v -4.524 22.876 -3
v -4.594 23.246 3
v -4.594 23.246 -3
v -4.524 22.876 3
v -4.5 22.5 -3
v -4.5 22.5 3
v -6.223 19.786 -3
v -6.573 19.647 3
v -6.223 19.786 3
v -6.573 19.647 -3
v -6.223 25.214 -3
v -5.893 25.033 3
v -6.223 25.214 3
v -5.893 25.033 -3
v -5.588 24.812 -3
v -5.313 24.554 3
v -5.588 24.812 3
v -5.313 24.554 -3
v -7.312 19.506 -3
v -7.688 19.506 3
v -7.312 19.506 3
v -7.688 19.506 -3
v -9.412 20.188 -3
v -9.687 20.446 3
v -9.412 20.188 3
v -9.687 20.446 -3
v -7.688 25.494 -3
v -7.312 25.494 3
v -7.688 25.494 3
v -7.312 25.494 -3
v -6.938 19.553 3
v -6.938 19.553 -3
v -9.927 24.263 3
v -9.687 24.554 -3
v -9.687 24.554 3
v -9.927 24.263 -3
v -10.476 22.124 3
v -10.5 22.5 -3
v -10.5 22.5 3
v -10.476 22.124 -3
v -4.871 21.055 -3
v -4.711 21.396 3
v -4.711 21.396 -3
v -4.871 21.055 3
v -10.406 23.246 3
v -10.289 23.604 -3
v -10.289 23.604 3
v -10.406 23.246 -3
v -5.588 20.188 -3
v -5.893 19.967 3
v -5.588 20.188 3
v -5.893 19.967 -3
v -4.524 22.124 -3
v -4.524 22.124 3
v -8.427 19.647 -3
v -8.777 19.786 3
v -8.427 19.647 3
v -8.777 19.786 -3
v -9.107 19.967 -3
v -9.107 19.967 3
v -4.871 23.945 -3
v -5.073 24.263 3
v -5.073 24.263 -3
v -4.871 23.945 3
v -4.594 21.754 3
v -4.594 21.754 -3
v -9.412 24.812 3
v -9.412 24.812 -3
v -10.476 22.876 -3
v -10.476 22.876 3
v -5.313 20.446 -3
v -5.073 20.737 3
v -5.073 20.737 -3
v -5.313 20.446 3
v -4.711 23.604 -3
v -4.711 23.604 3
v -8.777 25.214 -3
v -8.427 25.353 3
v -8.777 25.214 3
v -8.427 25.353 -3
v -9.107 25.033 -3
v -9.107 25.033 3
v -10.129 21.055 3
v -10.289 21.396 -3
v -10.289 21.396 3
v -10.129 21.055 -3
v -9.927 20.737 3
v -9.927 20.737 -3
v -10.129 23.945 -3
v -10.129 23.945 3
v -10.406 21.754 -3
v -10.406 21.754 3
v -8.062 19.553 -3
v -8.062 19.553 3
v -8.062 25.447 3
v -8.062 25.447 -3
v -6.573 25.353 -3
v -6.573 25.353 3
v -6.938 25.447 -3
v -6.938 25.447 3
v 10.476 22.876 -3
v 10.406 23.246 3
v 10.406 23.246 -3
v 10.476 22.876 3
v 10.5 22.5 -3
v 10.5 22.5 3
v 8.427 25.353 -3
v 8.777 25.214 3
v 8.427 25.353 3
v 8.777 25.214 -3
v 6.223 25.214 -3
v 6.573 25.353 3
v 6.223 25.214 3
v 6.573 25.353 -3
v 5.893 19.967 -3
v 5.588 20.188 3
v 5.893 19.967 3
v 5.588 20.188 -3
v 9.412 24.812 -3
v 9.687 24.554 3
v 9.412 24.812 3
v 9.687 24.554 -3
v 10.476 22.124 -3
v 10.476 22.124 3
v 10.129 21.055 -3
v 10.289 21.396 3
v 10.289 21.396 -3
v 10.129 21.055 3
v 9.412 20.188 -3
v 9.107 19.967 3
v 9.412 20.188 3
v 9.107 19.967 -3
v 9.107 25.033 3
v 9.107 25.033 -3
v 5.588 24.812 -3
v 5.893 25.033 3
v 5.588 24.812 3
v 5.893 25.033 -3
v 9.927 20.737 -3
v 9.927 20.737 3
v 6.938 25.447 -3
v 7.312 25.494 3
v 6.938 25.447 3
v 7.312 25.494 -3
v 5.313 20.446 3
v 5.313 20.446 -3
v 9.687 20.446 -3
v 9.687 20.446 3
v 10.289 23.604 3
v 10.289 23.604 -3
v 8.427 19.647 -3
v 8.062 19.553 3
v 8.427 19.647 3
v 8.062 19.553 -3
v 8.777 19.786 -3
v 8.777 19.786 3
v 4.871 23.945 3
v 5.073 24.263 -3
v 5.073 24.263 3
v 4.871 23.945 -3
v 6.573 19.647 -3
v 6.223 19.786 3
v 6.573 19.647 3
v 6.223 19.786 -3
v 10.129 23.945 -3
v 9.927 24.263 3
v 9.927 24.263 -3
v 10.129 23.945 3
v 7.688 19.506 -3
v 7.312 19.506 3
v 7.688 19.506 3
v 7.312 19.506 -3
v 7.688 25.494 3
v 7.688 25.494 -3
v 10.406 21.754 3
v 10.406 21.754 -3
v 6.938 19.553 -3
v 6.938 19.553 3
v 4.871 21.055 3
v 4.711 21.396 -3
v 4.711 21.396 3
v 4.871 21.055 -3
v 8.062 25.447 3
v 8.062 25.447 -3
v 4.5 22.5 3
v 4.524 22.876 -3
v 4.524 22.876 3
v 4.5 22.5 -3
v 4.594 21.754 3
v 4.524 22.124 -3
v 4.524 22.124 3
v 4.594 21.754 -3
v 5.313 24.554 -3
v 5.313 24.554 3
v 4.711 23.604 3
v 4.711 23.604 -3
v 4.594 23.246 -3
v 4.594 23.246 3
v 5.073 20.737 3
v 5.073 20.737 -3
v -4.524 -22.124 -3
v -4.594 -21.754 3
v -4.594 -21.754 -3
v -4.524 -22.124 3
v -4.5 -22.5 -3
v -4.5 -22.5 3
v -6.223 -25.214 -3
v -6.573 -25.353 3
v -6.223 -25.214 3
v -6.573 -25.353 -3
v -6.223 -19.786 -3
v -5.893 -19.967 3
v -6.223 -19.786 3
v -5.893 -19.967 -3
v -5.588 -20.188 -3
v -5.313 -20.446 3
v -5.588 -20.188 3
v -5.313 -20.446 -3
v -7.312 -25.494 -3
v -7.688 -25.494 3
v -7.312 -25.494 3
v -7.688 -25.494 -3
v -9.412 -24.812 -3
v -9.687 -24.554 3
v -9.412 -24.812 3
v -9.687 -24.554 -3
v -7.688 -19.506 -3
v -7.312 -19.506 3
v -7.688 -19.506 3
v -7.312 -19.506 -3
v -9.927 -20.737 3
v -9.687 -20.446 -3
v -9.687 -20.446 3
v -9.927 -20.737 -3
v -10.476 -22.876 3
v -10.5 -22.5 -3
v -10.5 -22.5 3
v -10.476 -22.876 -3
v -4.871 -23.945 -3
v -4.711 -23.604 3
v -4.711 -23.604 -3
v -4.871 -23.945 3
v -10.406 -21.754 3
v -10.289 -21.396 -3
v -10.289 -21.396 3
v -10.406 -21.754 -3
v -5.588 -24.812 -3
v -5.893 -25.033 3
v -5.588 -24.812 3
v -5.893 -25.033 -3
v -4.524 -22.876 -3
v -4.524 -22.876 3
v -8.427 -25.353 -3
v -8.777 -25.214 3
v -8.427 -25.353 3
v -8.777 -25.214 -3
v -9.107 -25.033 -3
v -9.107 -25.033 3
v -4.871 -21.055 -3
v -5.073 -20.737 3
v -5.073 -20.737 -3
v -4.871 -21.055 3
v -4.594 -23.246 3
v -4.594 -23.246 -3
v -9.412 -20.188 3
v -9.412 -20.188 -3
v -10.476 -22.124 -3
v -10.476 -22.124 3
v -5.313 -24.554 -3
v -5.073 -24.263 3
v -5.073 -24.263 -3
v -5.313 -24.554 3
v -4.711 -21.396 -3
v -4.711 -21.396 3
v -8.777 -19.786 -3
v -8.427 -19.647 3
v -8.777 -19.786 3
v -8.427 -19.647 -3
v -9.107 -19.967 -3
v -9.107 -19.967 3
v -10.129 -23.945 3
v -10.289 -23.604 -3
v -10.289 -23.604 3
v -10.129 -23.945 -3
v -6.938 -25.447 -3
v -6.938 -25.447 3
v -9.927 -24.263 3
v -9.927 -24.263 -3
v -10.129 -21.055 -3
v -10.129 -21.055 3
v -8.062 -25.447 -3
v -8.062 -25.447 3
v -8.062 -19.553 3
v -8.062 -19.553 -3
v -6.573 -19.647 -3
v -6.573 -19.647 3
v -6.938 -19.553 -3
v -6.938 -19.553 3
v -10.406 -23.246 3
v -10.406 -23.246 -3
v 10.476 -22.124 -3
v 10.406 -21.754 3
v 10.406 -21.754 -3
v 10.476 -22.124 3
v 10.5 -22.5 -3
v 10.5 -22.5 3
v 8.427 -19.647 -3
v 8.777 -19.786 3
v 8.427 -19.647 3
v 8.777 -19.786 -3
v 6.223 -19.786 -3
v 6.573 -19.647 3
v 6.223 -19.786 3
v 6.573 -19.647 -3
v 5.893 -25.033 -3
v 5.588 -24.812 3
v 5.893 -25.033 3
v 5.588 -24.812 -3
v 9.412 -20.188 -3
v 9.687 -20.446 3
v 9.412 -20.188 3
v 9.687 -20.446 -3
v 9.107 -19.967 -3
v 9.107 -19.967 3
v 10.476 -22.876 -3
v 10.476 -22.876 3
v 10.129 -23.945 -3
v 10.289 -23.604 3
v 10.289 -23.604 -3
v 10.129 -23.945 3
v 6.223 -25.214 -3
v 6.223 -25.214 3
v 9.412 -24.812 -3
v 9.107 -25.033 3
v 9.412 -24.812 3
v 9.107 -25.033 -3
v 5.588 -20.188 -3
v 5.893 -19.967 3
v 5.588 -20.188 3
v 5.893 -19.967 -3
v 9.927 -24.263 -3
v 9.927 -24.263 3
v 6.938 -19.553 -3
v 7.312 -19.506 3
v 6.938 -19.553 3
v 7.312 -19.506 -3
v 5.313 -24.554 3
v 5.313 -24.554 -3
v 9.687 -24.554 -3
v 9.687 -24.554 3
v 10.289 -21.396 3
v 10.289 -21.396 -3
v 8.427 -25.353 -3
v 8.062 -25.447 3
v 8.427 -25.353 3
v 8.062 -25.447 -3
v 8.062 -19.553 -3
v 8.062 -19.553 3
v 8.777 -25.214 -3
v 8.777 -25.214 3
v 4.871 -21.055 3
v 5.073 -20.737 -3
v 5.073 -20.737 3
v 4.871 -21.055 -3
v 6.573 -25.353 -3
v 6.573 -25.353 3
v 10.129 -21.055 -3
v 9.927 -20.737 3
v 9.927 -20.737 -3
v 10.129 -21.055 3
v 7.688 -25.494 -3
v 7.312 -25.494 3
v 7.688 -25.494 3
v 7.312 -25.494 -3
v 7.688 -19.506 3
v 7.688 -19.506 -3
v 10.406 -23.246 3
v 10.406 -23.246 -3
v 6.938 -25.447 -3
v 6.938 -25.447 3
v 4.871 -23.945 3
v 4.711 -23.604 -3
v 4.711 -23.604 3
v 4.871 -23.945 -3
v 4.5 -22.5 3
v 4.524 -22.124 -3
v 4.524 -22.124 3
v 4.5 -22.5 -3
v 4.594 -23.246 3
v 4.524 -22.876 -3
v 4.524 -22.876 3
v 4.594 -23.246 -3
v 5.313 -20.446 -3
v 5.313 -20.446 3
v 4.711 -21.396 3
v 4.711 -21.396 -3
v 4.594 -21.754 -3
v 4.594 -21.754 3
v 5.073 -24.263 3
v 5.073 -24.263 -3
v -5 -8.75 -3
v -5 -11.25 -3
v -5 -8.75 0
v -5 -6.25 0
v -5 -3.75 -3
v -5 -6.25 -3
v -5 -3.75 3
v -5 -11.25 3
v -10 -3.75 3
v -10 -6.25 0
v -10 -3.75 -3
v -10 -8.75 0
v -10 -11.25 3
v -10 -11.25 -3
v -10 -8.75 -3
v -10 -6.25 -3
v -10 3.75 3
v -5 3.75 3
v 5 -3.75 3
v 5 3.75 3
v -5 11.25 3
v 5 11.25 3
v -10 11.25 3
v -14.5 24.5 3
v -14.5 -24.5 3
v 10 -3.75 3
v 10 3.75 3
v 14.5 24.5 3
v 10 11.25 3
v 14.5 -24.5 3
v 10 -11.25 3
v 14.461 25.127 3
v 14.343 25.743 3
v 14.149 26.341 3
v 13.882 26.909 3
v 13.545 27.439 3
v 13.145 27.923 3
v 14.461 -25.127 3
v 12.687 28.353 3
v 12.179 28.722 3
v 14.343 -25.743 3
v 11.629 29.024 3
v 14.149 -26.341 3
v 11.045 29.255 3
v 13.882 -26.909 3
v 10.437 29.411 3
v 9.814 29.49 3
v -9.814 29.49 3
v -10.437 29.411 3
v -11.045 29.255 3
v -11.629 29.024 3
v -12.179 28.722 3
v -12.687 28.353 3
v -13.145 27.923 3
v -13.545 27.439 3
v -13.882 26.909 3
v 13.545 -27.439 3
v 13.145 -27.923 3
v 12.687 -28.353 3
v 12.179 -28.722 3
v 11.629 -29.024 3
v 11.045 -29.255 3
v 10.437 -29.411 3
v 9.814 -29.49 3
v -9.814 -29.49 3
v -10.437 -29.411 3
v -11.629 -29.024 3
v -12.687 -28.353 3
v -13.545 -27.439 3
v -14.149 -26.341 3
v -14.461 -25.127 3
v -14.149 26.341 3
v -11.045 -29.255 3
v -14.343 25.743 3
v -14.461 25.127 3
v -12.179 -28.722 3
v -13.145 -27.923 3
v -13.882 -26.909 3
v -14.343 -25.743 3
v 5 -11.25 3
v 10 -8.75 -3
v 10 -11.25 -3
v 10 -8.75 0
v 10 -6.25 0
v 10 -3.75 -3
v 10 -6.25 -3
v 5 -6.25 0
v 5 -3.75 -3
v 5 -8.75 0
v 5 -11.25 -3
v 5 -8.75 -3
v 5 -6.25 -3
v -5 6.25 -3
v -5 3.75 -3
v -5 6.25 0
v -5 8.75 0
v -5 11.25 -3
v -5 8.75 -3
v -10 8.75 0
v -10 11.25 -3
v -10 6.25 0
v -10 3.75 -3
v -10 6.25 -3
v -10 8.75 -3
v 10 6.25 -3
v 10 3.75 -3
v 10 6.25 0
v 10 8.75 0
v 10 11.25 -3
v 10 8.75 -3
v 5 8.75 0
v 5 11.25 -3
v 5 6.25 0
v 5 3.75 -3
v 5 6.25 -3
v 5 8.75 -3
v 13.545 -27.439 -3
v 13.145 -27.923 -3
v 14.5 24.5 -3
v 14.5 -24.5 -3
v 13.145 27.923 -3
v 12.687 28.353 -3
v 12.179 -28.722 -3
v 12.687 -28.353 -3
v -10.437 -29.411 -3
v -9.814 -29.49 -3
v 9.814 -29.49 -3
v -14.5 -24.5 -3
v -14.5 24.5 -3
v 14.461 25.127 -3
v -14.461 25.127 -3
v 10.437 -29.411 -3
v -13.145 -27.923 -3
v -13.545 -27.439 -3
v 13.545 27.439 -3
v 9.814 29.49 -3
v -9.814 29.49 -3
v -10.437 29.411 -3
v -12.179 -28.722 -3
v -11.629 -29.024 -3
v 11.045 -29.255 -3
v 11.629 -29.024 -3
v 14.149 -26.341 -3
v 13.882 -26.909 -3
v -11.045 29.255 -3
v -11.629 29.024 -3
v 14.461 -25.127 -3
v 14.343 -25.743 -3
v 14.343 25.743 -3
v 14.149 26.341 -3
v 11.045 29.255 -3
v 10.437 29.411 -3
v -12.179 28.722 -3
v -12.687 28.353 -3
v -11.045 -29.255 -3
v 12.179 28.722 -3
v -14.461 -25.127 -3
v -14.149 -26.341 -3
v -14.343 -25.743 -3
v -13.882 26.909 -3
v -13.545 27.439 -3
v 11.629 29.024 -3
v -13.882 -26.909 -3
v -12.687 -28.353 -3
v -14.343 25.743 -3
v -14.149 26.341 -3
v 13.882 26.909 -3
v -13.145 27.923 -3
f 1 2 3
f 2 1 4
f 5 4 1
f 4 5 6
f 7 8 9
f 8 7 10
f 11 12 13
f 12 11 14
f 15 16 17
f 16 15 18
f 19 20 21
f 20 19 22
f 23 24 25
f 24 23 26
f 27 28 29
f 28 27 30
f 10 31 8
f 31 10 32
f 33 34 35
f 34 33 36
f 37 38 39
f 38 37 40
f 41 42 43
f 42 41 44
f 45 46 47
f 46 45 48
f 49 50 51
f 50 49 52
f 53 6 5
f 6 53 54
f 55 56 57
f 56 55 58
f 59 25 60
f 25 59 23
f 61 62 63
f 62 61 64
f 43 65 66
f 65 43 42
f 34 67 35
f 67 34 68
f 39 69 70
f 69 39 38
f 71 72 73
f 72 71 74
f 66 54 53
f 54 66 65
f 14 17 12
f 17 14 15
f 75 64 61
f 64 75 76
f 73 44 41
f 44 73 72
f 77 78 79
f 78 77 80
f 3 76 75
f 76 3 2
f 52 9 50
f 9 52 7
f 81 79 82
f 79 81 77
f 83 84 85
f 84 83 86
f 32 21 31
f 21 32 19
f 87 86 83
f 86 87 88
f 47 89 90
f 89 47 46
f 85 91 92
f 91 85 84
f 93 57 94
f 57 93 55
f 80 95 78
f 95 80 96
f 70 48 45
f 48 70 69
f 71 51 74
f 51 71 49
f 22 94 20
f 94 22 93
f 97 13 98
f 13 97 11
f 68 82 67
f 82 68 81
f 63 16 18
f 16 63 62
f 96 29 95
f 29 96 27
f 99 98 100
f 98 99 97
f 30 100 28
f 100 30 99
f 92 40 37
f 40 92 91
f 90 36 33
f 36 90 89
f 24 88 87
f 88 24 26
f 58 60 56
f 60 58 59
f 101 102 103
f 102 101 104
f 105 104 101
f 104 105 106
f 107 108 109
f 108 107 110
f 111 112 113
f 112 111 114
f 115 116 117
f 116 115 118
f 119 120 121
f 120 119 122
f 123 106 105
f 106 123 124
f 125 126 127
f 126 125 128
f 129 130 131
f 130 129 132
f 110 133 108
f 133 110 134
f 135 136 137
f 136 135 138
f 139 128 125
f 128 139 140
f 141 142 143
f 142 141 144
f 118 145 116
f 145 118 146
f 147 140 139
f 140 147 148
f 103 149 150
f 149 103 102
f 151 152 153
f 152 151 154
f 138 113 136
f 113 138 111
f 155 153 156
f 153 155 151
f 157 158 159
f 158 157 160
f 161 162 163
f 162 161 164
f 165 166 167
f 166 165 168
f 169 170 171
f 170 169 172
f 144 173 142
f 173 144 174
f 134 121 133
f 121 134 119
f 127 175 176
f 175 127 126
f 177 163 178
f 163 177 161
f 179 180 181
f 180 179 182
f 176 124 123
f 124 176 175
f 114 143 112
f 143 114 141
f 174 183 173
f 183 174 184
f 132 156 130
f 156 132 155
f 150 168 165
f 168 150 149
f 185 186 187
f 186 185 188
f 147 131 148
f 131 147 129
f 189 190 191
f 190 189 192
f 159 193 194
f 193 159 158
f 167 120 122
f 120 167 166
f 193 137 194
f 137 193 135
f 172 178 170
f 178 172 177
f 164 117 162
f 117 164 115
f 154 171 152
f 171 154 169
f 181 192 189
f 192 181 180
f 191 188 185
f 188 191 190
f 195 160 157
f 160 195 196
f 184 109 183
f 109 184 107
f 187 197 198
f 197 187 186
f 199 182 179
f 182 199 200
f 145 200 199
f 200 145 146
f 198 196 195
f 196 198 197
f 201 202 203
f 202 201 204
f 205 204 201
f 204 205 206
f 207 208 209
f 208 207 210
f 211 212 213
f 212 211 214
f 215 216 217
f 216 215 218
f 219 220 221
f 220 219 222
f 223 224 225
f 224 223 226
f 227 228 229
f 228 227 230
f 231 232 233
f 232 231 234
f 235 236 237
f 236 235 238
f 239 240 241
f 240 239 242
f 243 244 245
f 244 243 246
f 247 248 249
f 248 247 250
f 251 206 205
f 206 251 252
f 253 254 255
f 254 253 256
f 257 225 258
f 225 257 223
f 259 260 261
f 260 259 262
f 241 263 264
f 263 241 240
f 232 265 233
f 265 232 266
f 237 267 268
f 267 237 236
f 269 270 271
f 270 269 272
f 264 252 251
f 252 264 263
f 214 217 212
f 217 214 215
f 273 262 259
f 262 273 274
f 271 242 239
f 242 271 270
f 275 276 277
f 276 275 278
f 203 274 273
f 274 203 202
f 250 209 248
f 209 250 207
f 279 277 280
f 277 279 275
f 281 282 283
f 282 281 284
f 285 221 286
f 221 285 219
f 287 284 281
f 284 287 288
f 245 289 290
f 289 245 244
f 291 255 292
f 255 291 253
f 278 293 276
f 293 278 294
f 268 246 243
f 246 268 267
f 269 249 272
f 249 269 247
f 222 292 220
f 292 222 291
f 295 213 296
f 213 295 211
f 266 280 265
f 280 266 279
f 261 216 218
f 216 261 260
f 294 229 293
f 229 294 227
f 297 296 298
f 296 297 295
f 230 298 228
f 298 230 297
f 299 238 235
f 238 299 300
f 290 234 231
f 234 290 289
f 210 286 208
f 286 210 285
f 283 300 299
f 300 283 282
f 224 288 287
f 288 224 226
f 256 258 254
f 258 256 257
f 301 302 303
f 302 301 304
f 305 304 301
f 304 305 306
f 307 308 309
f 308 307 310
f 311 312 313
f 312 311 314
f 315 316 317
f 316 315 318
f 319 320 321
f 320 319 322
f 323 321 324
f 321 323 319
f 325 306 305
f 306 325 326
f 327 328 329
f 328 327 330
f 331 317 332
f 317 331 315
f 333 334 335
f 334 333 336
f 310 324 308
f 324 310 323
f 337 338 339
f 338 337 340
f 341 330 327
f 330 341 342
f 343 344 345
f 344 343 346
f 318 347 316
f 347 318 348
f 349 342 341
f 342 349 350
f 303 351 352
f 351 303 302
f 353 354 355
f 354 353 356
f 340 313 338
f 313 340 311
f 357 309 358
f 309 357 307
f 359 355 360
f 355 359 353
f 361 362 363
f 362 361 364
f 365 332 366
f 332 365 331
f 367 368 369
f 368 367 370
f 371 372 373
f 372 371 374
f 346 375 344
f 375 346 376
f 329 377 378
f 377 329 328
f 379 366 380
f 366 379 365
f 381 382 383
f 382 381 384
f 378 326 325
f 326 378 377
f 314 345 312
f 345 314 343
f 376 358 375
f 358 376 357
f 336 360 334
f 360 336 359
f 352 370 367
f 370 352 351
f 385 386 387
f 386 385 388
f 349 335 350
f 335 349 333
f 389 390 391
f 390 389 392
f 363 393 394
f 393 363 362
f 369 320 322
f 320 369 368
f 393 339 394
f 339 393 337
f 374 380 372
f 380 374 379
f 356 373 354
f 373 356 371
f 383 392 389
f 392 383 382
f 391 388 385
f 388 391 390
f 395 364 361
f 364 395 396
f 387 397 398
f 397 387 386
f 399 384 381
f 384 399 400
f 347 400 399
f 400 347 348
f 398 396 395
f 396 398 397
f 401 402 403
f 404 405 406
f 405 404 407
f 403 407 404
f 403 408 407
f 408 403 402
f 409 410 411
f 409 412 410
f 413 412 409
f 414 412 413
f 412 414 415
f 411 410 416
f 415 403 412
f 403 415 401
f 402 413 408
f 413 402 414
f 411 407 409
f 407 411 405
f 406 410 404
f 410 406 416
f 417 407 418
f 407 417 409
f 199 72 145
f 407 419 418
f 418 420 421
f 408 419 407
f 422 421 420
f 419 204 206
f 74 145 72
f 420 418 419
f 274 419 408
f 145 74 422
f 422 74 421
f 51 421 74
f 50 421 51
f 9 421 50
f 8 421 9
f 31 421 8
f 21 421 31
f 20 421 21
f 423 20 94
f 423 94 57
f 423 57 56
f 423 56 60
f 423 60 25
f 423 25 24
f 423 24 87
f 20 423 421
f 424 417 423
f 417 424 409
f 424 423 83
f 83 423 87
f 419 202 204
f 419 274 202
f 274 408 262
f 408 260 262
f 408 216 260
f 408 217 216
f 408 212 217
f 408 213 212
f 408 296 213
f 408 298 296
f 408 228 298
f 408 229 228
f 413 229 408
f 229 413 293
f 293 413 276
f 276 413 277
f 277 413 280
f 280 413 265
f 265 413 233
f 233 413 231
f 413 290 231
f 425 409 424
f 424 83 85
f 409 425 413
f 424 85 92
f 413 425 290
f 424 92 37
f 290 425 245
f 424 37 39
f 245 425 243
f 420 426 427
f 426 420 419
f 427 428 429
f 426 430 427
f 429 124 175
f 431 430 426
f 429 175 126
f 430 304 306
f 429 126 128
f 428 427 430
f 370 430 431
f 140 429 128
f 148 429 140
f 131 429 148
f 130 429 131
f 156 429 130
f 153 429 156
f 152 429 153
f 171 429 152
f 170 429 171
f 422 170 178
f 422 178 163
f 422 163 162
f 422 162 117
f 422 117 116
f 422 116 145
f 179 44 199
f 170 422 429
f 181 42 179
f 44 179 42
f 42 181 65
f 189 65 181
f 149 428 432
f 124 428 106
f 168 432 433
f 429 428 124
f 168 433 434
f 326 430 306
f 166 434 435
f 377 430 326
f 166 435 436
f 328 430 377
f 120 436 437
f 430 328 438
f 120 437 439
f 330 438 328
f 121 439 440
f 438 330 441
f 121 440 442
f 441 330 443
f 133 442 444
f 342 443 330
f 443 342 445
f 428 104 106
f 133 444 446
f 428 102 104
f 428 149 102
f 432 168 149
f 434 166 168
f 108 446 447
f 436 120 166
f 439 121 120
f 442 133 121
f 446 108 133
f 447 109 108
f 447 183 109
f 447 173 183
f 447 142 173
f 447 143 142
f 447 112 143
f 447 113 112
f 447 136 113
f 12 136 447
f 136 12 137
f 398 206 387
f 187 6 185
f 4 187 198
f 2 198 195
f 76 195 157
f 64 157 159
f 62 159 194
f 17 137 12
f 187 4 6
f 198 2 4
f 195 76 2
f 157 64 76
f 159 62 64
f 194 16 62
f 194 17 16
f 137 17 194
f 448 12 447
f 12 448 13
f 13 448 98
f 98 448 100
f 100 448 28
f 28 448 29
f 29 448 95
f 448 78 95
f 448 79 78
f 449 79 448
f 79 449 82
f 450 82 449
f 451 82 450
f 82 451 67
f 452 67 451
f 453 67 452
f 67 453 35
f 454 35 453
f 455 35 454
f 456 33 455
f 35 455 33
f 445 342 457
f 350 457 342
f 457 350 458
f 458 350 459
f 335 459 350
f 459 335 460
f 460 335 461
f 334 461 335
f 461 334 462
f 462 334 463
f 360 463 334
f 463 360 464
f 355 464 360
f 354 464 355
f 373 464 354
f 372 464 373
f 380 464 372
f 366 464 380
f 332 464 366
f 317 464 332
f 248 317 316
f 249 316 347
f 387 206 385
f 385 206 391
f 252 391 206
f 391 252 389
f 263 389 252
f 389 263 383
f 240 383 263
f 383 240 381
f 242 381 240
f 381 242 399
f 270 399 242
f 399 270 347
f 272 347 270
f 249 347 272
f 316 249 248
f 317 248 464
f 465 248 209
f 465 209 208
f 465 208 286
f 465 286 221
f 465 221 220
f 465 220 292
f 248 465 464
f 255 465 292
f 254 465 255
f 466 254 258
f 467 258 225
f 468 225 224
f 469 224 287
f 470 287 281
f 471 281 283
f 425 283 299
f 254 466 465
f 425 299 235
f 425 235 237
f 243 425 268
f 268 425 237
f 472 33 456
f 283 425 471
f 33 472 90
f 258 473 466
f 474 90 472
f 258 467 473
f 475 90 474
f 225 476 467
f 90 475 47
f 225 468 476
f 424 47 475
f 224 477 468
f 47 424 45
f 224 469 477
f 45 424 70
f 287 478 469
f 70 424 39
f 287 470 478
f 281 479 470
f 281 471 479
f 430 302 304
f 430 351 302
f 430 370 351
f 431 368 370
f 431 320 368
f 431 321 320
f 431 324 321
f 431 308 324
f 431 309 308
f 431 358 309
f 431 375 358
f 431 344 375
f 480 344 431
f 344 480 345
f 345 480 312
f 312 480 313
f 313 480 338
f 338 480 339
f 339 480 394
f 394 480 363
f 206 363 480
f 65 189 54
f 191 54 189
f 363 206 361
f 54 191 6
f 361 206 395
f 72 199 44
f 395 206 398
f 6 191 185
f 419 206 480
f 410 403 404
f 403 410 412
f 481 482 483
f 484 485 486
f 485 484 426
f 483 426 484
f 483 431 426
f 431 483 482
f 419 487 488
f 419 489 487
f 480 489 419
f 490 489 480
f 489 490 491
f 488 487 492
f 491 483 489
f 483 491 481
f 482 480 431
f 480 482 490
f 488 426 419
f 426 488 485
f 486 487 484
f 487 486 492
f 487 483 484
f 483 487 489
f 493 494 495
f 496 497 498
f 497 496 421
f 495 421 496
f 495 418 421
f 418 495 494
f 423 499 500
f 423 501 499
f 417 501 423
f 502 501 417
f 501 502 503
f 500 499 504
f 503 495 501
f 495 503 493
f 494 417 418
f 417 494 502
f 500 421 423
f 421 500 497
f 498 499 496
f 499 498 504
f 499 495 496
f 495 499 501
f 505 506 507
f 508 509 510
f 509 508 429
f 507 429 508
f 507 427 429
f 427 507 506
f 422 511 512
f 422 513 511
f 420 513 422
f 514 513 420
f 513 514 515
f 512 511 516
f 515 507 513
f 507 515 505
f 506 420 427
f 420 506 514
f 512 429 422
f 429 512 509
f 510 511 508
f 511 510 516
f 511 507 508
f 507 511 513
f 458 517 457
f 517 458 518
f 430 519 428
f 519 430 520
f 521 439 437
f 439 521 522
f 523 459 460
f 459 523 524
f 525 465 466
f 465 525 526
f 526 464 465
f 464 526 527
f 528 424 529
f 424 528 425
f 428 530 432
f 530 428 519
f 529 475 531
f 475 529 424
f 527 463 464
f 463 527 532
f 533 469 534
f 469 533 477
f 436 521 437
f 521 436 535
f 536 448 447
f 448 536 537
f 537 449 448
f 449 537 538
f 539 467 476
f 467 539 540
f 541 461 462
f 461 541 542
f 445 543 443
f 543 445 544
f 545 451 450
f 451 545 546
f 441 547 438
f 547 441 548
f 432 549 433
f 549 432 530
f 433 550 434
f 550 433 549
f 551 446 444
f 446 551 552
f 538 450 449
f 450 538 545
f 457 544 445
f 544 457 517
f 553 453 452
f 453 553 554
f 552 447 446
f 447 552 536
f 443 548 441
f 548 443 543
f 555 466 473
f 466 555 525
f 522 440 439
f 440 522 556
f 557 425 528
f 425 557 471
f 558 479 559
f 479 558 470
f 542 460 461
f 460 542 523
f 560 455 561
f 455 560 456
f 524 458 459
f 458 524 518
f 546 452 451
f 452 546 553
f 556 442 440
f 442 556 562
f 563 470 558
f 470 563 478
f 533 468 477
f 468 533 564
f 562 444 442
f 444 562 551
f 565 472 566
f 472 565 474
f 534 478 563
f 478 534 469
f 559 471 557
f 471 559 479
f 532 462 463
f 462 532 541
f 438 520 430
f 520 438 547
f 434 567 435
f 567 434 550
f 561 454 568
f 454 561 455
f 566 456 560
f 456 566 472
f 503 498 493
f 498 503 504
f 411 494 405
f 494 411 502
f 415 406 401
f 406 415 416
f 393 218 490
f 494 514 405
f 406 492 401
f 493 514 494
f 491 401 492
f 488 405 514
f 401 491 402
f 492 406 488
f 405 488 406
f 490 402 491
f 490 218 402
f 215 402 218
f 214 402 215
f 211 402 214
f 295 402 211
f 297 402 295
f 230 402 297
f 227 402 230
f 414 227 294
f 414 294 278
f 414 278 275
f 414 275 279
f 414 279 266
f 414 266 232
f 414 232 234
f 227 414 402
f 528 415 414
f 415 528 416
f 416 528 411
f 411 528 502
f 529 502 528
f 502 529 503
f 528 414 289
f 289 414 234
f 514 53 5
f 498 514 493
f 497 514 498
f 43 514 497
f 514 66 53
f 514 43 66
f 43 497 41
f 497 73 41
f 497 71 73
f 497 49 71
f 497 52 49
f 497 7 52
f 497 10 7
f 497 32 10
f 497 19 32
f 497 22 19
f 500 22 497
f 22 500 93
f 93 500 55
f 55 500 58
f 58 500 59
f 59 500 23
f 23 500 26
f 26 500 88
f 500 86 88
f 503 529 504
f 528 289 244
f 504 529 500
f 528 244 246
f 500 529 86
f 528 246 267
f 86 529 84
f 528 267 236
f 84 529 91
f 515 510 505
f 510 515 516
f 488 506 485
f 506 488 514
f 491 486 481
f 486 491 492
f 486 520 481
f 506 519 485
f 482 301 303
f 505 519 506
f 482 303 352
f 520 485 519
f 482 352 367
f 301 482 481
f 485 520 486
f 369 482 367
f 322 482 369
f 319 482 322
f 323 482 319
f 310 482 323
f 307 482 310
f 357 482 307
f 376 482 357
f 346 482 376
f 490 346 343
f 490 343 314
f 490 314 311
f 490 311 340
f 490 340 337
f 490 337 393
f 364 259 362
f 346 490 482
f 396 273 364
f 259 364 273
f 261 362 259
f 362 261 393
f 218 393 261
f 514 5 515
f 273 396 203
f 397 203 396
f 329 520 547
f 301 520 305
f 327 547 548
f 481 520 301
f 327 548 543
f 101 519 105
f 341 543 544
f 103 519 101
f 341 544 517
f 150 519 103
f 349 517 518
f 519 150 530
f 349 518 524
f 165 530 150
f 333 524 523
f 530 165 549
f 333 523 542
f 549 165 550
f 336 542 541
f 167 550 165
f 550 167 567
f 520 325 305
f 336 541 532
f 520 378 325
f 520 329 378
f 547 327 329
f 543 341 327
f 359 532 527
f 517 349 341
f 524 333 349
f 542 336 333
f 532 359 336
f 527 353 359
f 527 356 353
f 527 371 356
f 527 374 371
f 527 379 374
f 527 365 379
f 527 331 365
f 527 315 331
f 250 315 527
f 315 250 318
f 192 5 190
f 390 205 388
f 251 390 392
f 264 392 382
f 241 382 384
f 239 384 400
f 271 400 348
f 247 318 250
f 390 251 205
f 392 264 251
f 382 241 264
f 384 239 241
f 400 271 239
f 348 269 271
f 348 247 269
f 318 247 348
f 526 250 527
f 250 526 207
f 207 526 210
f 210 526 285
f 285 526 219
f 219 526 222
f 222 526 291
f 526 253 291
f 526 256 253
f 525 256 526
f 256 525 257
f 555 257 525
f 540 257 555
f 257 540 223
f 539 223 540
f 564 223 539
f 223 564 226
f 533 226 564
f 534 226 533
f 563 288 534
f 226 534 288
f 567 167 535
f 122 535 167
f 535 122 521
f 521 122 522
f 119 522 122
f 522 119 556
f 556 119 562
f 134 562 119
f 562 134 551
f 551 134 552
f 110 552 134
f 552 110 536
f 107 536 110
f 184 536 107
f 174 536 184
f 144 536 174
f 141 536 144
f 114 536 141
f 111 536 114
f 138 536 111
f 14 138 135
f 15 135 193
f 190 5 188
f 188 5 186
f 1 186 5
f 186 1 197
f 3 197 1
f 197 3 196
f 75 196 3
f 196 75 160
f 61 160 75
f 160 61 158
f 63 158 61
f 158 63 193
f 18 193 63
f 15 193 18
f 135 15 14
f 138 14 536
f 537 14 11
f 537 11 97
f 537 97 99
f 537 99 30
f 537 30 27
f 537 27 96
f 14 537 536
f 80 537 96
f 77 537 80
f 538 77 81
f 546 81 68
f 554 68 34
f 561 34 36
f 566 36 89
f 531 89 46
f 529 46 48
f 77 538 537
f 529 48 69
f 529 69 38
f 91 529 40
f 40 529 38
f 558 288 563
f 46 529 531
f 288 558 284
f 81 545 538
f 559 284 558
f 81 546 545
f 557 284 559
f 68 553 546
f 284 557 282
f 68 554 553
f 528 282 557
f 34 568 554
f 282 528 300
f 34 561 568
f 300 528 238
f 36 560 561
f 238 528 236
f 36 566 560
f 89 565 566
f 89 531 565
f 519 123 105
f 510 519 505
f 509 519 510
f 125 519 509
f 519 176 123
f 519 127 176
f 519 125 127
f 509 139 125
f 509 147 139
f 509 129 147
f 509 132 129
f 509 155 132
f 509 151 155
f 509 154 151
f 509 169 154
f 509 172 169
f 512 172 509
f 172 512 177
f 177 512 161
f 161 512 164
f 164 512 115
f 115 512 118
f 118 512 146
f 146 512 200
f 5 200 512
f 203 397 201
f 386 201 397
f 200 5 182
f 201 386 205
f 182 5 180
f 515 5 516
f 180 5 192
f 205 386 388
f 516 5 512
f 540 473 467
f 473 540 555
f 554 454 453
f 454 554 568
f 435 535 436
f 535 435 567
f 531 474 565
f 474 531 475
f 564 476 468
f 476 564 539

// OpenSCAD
$fn = 50;


difference() {
	union() {
		translate(v = [0, 0, -3.0000000000]) {
			rotate(a = [0, 0, 0]) {
				hull() {
					translate(v = [-9.5000000000, 24.5000000000, 0]) {
						rotate(a = [0, 0, 0]) {
							translate(v = [0, 0, 0]) {
								rotate(a = [0, 0, 0]) {
									cylinder(h = 6, r = 5);
								}
							}
						}
					}
					translate(v = [9.5000000000, 24.5000000000, 0]) {
						rotate(a = [0, 0, 0]) {
							translate(v = [0, 0, 0]) {
								rotate(a = [0, 0, 0]) {
									cylinder(h = 6, r = 5);
								}
							}
						}
					}
					translate(v = [-9.5000000000, -24.5000000000, 0]) {
						rotate(a = [0, 0, 0]) {
							translate(v = [0, 0, 0]) {
								rotate(a = [0, 0, 0]) {
									cylinder(h = 6, r = 5);
								}
							}
						}
					}
					translate(v = [9.5000000000, -24.5000000000, 0]) {
						rotate(a = [0, 0, 0]) {
							translate(v = [0, 0, 0]) {
								rotate(a = [0, 0, 0]) {
									cylinder(h = 6, r = 5);
								}
							}
						}
					}
				}
			}
		}
	}
	union() {
		translate(v = [-7.5000000000, 22.5000000000, -125.0000000000]) {
			rotate(a = [0, 0, 0]) {
				cylinder(h = 250, r = 3.0000000000);
			}
		}
		translate(v = [7.5000000000, 22.5000000000, -125.0000000000]) {
			rotate(a = [0, 0, 0]) {
				cylinder(h = 250, r = 3.0000000000);
			}
		}
		translate(v = [-7.5000000000, -22.5000000000, -125.0000000000]) {
			rotate(a = [0, 0, 0]) {
				cylinder(h = 250, r = 3.0000000000);
			}
		}
		translate(v = [7.5000000000, -22.5000000000, -125.0000000000]) {
			rotate(a = [0, 0, 0]) {
				cylinder(h = 250, r = 3.0000000000);
			}
		}
		translate(v = [-10.0000000000, -11.2500000000, -50]) {
			rotate(a = [0, 0, 0]) {
				cube(size = [5, 2.5000000000, 100]);
			}
		}
		translate(v = [-10.0000000000, -6.2500000000, -50]) {
			rotate(a = [0, 0, 0]) {
				cube(size = [5, 2.5000000000, 100]);
			}
		}
		translate(v = [-10.0000000000, -11.2500000000, 0]) {
			rotate(a = [0, 0, 0]) {
				cube(size = [5, 7.5000000000, 3]);
			}
		}
		translate(v = [5.0000000000, -11.2500000000, -50]) {
			rotate(a = [0, 0, 0]) {
				cube(size = [5, 2.5000000000, 100]);
			}
		}
		translate(v = [5.0000000000, -6.2500000000, -50]) {
			rotate(a = [0, 0, 0]) {
				cube(size = [5, 2.5000000000, 100]);
			}
		}
		translate(v = [5.0000000000, -11.2500000000, 0]) {
			rotate(a = [0, 0, 0]) {
				cube(size = [5, 7.5000000000, 3]);
			}
		}
		translate(v = [-10.0000000000, 3.7500000000, -50]) {
			rotate(a = [0, 0, 0]) {
				cube(size = [5, 2.5000000000, 100]);
			}
		}
		translate(v = [-10.0000000000, 8.7500000000, -50]) {
			rotate(a = [0, 0, 0]) {
				cube(size = [5, 2.5000000000, 100]);
			}
		}
		translate(v = [-10.0000000000, 3.7500000000, 0]) {
			rotate(a = [0, 0, 0]) {
				cube(size = [5, 7.5000000000, 3]);
			}
		}
		translate(v = [5.0000000000, 3.7500000000, -50]) {
			rotate(a = [0, 0, 0]) {
				cube(size = [5, 2.5000000000, 100]);
			}
		}
		translate(v = [5.0000000000, 8.7500000000, -50]) {
			rotate(a = [0, 0, 0]) {
				cube(size = [5, 2.5000000000, 100]);
			}
		}
		translate(v = [5.0000000000, 3.7500000000, 0]) {
			rotate(a = [0, 0, 0]) {
				cube(size = [5, 7.5000000000, 3]);
			}
		}
	}
}
